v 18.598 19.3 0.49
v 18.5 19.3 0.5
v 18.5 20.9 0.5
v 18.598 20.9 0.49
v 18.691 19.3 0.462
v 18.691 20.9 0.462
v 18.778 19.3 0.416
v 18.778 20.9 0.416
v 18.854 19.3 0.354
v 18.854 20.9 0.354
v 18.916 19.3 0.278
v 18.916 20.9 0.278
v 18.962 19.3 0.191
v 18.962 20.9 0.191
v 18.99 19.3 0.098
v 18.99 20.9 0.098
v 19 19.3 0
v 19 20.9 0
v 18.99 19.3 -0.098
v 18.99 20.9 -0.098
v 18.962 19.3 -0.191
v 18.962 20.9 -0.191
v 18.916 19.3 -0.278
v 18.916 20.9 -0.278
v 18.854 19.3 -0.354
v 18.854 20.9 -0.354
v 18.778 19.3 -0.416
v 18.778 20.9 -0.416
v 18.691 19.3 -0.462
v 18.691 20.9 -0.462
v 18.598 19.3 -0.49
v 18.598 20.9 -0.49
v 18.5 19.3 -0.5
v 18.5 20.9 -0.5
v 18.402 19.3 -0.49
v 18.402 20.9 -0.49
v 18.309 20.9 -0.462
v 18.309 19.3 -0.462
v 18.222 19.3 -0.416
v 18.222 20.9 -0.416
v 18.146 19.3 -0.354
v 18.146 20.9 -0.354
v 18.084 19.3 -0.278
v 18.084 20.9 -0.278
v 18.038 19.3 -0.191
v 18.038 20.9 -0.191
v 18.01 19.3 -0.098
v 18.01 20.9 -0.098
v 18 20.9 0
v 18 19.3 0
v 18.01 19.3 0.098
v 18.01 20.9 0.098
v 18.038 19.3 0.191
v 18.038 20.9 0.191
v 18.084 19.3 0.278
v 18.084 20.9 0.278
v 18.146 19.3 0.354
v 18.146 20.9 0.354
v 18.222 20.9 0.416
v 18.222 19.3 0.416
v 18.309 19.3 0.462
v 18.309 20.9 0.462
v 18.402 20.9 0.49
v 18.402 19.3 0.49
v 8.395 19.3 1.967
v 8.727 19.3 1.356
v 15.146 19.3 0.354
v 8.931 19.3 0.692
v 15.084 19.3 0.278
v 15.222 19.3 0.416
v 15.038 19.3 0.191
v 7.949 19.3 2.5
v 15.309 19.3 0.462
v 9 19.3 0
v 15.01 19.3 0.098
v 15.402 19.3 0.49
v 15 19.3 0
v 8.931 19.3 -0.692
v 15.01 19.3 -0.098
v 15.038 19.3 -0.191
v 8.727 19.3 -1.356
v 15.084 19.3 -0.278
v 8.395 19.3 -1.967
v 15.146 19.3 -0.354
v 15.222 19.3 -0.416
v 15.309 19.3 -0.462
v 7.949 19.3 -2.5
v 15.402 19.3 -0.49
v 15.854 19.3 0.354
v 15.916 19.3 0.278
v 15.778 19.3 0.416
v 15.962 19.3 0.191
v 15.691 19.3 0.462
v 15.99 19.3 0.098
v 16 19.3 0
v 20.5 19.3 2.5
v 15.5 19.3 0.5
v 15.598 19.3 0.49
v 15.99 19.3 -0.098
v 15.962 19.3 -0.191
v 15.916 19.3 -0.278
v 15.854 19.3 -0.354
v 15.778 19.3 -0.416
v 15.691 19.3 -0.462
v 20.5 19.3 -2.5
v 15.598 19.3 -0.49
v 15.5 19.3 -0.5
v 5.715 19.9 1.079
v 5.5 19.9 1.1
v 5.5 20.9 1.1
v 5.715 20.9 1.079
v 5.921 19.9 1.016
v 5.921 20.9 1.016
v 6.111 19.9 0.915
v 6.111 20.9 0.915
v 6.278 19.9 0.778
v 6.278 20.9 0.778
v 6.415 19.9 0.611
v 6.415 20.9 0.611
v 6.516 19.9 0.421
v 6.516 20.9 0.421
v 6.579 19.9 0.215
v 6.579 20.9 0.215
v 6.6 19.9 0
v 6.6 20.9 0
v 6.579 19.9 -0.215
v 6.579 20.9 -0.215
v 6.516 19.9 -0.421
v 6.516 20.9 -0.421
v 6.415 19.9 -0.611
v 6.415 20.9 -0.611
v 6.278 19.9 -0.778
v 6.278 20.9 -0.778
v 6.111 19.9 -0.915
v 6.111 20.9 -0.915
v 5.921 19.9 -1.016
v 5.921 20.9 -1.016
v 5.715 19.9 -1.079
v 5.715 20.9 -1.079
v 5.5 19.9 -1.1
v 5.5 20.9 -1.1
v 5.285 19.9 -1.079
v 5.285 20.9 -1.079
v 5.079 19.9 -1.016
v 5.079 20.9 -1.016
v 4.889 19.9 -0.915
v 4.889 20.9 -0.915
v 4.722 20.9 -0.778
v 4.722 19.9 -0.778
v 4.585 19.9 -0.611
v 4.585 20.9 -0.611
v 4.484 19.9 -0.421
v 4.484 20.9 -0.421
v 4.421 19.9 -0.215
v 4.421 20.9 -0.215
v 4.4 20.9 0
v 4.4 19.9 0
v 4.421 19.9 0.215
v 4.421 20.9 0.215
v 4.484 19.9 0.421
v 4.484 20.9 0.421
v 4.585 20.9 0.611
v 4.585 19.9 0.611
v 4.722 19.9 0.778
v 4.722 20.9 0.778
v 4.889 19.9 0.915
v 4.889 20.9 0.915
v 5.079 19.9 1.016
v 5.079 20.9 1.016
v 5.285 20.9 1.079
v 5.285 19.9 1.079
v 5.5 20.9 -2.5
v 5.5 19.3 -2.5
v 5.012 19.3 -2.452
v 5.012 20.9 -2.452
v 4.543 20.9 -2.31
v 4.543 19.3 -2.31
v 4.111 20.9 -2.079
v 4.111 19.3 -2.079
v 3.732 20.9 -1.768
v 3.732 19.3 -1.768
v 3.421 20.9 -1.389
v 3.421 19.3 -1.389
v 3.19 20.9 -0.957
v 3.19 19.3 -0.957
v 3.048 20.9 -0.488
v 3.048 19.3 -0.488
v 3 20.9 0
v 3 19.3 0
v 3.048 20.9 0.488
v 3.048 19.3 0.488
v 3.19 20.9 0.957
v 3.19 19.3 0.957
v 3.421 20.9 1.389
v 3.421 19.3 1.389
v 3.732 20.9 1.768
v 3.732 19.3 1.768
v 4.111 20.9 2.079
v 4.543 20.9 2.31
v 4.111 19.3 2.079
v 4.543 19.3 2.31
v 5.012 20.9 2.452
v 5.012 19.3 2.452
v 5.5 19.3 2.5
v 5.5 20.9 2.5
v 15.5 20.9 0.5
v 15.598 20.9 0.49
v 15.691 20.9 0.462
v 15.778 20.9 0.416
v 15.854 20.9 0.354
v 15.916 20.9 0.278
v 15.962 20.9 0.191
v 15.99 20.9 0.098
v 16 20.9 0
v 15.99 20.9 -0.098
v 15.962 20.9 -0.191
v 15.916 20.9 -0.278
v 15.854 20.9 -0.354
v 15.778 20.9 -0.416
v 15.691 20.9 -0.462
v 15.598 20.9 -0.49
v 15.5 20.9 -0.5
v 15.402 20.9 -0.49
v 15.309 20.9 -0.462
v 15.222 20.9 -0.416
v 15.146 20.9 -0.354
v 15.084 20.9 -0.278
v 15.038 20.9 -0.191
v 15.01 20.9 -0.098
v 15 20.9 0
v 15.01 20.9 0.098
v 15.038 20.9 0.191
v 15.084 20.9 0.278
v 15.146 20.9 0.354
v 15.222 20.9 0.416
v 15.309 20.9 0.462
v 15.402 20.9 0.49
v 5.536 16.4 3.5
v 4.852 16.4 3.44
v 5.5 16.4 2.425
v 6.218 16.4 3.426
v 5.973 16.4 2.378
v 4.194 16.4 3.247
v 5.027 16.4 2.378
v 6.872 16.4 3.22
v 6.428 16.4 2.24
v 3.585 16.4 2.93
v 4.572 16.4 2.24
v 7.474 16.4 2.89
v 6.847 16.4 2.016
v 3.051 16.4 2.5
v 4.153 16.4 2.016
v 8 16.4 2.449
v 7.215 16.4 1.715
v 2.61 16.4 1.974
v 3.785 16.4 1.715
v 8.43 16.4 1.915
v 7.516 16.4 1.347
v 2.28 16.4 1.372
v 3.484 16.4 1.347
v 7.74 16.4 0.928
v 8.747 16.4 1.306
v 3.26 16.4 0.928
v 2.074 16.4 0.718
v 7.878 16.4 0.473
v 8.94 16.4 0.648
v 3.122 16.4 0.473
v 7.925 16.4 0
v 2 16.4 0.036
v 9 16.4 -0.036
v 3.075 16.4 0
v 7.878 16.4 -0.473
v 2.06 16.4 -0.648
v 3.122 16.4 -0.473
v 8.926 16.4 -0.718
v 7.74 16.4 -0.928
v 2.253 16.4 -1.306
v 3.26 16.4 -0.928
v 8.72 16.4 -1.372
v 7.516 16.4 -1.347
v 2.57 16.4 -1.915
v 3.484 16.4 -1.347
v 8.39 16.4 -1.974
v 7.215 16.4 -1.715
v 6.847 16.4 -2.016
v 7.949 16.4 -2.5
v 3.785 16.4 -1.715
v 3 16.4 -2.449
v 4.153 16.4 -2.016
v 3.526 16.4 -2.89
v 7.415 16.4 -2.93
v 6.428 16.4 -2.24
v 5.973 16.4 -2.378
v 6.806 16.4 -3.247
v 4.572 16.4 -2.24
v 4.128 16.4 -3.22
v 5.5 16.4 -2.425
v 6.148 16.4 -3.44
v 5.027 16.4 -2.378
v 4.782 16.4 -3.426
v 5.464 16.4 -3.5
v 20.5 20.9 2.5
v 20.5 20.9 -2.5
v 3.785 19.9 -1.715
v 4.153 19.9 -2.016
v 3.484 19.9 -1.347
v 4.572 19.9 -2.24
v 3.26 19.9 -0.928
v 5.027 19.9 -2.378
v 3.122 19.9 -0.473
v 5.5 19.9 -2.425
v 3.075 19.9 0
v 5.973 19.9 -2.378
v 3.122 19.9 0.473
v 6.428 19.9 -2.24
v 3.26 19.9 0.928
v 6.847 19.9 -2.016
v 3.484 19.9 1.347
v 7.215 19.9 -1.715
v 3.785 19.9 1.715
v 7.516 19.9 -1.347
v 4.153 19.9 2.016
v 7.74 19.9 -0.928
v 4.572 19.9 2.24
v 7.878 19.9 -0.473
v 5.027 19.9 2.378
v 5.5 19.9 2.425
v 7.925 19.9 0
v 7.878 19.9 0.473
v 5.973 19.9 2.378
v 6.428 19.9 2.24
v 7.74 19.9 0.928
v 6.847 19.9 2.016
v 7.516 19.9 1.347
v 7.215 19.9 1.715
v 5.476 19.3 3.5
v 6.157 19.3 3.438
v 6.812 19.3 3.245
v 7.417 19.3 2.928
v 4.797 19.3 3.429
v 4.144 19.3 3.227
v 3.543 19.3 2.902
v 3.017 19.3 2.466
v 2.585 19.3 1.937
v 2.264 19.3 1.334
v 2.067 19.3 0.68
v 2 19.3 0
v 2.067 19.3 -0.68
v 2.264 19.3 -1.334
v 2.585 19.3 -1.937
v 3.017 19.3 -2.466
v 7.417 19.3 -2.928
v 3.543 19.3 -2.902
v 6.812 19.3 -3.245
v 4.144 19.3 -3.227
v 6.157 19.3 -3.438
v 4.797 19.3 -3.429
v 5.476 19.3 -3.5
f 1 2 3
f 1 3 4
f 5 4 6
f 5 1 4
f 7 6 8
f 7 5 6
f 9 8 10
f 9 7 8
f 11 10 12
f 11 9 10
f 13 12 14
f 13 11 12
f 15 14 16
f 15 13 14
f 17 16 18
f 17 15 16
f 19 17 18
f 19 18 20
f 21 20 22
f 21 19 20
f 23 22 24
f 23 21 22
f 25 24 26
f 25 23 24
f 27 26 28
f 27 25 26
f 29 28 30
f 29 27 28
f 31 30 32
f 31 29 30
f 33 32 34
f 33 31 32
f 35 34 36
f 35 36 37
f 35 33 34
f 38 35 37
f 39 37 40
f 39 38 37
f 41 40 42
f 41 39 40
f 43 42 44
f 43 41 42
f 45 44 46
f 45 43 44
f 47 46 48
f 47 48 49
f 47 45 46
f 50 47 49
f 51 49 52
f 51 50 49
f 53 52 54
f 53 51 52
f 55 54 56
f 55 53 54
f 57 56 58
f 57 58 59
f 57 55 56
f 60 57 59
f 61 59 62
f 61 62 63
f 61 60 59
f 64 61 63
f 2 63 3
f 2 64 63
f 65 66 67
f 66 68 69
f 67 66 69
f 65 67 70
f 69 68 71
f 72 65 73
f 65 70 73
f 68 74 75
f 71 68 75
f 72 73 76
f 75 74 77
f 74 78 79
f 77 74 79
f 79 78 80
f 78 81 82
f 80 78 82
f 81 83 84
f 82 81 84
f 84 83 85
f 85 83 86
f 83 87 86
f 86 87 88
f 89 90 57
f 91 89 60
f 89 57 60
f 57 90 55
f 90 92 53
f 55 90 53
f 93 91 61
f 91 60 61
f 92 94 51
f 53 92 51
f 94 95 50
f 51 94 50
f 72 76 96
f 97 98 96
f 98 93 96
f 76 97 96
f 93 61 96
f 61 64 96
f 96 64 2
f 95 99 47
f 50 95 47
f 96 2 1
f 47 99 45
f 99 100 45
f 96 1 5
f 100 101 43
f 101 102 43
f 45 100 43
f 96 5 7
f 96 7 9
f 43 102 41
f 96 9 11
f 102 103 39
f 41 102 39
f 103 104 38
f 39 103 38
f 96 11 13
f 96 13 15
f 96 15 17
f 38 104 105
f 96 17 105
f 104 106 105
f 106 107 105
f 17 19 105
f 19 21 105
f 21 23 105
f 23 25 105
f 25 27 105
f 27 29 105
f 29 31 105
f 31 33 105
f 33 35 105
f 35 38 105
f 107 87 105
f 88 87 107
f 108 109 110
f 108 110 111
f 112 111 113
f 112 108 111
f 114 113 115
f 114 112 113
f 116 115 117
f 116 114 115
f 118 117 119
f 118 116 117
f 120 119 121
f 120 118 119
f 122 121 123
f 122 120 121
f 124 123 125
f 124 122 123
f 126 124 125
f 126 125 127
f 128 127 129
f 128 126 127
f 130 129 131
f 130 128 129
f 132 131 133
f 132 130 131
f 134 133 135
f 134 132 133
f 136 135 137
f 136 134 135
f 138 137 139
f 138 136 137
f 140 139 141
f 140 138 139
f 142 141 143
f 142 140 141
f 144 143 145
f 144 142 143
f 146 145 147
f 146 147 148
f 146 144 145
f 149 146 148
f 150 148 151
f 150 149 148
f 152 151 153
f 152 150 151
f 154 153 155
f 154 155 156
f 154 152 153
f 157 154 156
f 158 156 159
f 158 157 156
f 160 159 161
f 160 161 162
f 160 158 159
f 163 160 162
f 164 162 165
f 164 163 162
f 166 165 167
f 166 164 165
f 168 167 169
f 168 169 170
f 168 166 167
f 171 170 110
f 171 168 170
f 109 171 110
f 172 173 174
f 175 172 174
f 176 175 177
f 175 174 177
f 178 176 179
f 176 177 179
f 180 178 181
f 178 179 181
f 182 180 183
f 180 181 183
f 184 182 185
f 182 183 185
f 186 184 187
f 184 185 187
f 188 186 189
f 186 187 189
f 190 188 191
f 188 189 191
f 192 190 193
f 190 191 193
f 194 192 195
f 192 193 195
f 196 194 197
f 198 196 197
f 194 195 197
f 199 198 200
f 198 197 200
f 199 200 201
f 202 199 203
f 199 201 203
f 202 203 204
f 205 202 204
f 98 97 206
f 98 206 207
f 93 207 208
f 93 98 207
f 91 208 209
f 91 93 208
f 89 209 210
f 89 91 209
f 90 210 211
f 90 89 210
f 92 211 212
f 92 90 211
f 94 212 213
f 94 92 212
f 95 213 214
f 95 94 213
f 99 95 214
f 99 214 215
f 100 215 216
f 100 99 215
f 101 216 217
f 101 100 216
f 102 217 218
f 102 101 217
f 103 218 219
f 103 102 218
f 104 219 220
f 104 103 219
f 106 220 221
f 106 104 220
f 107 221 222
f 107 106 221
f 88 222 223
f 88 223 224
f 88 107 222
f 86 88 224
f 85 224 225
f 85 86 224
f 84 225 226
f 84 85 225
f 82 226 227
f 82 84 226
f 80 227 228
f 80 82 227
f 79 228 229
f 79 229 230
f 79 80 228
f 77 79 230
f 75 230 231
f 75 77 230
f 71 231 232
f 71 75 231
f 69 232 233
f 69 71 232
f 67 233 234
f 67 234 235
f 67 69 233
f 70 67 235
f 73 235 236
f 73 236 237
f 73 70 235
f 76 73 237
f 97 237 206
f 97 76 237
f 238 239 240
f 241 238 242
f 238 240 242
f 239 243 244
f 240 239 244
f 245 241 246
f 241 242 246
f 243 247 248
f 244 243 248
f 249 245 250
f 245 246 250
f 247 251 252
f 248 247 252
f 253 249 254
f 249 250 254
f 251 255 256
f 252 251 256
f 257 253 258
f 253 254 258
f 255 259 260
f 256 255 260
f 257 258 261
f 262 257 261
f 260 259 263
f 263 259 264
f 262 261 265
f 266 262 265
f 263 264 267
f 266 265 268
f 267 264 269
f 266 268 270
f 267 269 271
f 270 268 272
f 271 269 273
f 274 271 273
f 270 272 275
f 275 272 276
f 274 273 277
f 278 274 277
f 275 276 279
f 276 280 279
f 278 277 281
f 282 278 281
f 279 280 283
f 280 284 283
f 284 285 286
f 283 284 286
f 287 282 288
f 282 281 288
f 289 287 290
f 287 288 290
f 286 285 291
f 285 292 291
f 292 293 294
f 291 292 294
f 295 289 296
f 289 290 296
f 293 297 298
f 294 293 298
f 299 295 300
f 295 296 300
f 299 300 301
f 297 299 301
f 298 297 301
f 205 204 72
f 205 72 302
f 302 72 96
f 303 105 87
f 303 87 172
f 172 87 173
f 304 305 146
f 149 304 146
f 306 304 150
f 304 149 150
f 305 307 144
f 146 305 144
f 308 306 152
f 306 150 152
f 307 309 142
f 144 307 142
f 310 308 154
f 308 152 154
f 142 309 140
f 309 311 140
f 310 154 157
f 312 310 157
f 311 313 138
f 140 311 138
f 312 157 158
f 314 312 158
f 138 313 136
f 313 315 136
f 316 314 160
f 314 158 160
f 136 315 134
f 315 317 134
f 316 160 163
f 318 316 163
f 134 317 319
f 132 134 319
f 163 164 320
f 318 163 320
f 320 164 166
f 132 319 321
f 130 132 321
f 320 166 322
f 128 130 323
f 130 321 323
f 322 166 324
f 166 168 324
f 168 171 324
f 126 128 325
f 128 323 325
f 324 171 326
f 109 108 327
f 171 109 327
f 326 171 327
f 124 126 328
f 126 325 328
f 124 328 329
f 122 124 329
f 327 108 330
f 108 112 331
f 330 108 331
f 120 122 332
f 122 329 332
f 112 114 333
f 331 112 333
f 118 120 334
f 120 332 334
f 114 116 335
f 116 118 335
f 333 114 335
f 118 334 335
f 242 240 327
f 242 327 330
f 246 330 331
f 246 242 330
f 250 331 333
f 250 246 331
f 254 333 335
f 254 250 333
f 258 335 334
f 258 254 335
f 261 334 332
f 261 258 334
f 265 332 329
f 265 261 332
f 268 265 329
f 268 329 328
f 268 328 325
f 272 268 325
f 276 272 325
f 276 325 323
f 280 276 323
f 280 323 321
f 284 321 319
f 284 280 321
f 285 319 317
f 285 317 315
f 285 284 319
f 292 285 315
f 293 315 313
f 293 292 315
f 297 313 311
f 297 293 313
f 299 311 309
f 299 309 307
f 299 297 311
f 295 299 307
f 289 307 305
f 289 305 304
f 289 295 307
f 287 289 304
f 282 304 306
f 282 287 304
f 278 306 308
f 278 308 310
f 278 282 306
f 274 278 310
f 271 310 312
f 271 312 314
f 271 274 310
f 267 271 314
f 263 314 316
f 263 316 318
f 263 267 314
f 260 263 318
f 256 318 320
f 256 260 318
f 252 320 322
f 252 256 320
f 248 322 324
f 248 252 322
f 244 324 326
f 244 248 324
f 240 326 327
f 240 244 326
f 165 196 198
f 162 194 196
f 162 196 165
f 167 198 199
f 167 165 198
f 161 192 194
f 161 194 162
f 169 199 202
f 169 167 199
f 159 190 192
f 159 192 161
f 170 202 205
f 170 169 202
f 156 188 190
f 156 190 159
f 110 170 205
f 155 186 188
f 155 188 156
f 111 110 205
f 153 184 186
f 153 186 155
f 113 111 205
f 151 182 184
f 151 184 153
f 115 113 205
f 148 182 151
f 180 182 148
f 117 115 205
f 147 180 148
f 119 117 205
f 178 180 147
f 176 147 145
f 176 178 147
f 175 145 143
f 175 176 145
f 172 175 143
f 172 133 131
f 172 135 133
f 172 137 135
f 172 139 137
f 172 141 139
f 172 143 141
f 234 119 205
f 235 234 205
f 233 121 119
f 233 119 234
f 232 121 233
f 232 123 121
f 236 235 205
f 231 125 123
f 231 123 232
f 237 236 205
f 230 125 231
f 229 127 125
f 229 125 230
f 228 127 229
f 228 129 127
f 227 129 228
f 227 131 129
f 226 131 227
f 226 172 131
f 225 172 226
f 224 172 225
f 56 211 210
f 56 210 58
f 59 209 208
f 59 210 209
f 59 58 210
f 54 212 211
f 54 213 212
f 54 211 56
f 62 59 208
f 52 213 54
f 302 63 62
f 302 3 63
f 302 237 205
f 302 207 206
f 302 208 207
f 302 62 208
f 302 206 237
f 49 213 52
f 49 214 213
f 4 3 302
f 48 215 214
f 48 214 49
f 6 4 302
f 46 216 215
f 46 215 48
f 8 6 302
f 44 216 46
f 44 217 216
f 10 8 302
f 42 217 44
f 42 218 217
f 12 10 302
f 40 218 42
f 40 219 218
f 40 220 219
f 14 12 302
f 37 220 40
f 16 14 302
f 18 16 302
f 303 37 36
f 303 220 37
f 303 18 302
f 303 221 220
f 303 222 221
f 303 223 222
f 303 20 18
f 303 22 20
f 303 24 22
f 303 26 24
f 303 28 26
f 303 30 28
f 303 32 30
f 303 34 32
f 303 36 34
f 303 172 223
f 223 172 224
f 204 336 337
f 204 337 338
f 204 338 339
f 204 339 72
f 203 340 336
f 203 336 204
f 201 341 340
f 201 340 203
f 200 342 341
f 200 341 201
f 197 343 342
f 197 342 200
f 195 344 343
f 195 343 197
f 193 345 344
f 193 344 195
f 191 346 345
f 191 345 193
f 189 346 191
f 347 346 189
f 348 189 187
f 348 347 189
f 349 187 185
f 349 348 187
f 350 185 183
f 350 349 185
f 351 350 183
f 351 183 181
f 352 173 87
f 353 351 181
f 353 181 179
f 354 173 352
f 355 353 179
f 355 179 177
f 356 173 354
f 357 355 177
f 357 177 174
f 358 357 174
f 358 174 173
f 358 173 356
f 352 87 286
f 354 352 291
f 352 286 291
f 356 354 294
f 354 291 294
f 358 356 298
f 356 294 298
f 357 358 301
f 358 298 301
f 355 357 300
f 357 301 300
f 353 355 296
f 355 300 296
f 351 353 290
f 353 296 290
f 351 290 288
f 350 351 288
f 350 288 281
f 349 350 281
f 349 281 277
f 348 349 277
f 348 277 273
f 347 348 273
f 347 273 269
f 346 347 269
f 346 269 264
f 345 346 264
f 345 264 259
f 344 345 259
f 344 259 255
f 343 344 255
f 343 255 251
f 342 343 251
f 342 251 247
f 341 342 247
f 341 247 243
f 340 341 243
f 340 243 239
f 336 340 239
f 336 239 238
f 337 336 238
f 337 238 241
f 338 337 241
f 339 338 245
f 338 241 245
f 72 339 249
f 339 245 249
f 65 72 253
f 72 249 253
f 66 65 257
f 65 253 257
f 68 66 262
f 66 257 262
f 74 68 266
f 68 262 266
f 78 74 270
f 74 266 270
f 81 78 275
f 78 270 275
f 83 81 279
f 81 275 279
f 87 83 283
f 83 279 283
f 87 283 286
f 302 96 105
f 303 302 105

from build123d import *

# Parameters (mm, degrees)
BOSS_EXTRUDE1_DEPTH = 1.6
SKETCH2_R           = 3.5
BOSS_EXTRUDE2_DEPTH = 2.9
SKETCH3_R           = 2.425
CUT_EXTRUDE2_DEPTH  = 3.5
SKETCH4_R           = 1.1
CUT_EXTRUDE4_DEPTH  = 1
SKETCH5_R           = 0.5
CUT_EXTRUDE6_DEPTH  = 1.6
SKETCH6_R           = 0.5
CUT_EXTRUDE8_DEPTH  = 1.6


with BuildPart() as part:
    # Sketch1 → Boss-Extrude1 (new body)
    with BuildSketch(Plane(origin=(0, 19.3, 0), x_dir=(1, 0, 0), z_dir=(0, 1, 0))):
        with BuildLine():
            Line((5.5, -2.5), (20.5, -2.5))
            Line((20.5, -2.5), (20.5, 2.5))
            Line((20.5, 2.5), (5.5, 2.5))
            ThreePointArc((5.5, 2.5), (3, 0), (5.5, -2.5))
        make_face()
    extrude(amount=BOSS_EXTRUDE1_DEPTH)

    # Sketch2 → Boss-Extrude2 (add)
    with BuildSketch(Plane(origin=(0, 16.4, 0), x_dir=(1, 0, 0), z_dir=(0, 1, 0))):
        with Locations(Location((5.5, 0, 0), (0, 0, 45.584691403))):
            Circle(SKETCH2_R)
    extrude(amount=BOSS_EXTRUDE2_DEPTH)

    # Sketch3 → Cut-Extrude2 (cut)
    with BuildSketch(Plane(origin=(0, 16.4, 0), x_dir=(1, 0, 0), z_dir=(0, 1, 0))):
        with Locations(Location((5.5, 0, 0), (0, 0, 270))):
            Circle(SKETCH3_R)
    extrude(amount=CUT_EXTRUDE2_DEPTH, mode=Mode.SUBTRACT)

    # Sketch4 → Cut-Extrude4 (cut)
    with BuildSketch(Plane(origin=(0, 19.9, 0), x_dir=(1, 0, 0), z_dir=(0, 1, 0))):
        with Locations(Location((5.5, 0, 0), (0, 0, 270))):
            Circle(SKETCH4_R)
    extrude(amount=CUT_EXTRUDE4_DEPTH, mode=Mode.SUBTRACT)

    # Sketch5 → Cut-Extrude6 (cut)
    with BuildSketch(Plane(origin=(0, 19.3, 0), x_dir=(1, 0, 0), z_dir=(0, 1, 0))):
        with Locations(Location((15.5, 0, 0), (0, 0, 270))):
            Circle(SKETCH5_R)
    extrude(amount=CUT_EXTRUDE6_DEPTH, mode=Mode.SUBTRACT)

    # Sketch6 → Cut-Extrude8 (cut)
    with BuildSketch(Plane(origin=(0, 19.3, 0), x_dir=(1, 0, 0), z_dir=(0, 1, 0))):
        with Locations(Location((18.5, 0, 0), (0, 0, 270))):
            Circle(SKETCH6_R)
    extrude(amount=CUT_EXTRUDE8_DEPTH, mode=Mode.SUBTRACT)


solid = part.part
